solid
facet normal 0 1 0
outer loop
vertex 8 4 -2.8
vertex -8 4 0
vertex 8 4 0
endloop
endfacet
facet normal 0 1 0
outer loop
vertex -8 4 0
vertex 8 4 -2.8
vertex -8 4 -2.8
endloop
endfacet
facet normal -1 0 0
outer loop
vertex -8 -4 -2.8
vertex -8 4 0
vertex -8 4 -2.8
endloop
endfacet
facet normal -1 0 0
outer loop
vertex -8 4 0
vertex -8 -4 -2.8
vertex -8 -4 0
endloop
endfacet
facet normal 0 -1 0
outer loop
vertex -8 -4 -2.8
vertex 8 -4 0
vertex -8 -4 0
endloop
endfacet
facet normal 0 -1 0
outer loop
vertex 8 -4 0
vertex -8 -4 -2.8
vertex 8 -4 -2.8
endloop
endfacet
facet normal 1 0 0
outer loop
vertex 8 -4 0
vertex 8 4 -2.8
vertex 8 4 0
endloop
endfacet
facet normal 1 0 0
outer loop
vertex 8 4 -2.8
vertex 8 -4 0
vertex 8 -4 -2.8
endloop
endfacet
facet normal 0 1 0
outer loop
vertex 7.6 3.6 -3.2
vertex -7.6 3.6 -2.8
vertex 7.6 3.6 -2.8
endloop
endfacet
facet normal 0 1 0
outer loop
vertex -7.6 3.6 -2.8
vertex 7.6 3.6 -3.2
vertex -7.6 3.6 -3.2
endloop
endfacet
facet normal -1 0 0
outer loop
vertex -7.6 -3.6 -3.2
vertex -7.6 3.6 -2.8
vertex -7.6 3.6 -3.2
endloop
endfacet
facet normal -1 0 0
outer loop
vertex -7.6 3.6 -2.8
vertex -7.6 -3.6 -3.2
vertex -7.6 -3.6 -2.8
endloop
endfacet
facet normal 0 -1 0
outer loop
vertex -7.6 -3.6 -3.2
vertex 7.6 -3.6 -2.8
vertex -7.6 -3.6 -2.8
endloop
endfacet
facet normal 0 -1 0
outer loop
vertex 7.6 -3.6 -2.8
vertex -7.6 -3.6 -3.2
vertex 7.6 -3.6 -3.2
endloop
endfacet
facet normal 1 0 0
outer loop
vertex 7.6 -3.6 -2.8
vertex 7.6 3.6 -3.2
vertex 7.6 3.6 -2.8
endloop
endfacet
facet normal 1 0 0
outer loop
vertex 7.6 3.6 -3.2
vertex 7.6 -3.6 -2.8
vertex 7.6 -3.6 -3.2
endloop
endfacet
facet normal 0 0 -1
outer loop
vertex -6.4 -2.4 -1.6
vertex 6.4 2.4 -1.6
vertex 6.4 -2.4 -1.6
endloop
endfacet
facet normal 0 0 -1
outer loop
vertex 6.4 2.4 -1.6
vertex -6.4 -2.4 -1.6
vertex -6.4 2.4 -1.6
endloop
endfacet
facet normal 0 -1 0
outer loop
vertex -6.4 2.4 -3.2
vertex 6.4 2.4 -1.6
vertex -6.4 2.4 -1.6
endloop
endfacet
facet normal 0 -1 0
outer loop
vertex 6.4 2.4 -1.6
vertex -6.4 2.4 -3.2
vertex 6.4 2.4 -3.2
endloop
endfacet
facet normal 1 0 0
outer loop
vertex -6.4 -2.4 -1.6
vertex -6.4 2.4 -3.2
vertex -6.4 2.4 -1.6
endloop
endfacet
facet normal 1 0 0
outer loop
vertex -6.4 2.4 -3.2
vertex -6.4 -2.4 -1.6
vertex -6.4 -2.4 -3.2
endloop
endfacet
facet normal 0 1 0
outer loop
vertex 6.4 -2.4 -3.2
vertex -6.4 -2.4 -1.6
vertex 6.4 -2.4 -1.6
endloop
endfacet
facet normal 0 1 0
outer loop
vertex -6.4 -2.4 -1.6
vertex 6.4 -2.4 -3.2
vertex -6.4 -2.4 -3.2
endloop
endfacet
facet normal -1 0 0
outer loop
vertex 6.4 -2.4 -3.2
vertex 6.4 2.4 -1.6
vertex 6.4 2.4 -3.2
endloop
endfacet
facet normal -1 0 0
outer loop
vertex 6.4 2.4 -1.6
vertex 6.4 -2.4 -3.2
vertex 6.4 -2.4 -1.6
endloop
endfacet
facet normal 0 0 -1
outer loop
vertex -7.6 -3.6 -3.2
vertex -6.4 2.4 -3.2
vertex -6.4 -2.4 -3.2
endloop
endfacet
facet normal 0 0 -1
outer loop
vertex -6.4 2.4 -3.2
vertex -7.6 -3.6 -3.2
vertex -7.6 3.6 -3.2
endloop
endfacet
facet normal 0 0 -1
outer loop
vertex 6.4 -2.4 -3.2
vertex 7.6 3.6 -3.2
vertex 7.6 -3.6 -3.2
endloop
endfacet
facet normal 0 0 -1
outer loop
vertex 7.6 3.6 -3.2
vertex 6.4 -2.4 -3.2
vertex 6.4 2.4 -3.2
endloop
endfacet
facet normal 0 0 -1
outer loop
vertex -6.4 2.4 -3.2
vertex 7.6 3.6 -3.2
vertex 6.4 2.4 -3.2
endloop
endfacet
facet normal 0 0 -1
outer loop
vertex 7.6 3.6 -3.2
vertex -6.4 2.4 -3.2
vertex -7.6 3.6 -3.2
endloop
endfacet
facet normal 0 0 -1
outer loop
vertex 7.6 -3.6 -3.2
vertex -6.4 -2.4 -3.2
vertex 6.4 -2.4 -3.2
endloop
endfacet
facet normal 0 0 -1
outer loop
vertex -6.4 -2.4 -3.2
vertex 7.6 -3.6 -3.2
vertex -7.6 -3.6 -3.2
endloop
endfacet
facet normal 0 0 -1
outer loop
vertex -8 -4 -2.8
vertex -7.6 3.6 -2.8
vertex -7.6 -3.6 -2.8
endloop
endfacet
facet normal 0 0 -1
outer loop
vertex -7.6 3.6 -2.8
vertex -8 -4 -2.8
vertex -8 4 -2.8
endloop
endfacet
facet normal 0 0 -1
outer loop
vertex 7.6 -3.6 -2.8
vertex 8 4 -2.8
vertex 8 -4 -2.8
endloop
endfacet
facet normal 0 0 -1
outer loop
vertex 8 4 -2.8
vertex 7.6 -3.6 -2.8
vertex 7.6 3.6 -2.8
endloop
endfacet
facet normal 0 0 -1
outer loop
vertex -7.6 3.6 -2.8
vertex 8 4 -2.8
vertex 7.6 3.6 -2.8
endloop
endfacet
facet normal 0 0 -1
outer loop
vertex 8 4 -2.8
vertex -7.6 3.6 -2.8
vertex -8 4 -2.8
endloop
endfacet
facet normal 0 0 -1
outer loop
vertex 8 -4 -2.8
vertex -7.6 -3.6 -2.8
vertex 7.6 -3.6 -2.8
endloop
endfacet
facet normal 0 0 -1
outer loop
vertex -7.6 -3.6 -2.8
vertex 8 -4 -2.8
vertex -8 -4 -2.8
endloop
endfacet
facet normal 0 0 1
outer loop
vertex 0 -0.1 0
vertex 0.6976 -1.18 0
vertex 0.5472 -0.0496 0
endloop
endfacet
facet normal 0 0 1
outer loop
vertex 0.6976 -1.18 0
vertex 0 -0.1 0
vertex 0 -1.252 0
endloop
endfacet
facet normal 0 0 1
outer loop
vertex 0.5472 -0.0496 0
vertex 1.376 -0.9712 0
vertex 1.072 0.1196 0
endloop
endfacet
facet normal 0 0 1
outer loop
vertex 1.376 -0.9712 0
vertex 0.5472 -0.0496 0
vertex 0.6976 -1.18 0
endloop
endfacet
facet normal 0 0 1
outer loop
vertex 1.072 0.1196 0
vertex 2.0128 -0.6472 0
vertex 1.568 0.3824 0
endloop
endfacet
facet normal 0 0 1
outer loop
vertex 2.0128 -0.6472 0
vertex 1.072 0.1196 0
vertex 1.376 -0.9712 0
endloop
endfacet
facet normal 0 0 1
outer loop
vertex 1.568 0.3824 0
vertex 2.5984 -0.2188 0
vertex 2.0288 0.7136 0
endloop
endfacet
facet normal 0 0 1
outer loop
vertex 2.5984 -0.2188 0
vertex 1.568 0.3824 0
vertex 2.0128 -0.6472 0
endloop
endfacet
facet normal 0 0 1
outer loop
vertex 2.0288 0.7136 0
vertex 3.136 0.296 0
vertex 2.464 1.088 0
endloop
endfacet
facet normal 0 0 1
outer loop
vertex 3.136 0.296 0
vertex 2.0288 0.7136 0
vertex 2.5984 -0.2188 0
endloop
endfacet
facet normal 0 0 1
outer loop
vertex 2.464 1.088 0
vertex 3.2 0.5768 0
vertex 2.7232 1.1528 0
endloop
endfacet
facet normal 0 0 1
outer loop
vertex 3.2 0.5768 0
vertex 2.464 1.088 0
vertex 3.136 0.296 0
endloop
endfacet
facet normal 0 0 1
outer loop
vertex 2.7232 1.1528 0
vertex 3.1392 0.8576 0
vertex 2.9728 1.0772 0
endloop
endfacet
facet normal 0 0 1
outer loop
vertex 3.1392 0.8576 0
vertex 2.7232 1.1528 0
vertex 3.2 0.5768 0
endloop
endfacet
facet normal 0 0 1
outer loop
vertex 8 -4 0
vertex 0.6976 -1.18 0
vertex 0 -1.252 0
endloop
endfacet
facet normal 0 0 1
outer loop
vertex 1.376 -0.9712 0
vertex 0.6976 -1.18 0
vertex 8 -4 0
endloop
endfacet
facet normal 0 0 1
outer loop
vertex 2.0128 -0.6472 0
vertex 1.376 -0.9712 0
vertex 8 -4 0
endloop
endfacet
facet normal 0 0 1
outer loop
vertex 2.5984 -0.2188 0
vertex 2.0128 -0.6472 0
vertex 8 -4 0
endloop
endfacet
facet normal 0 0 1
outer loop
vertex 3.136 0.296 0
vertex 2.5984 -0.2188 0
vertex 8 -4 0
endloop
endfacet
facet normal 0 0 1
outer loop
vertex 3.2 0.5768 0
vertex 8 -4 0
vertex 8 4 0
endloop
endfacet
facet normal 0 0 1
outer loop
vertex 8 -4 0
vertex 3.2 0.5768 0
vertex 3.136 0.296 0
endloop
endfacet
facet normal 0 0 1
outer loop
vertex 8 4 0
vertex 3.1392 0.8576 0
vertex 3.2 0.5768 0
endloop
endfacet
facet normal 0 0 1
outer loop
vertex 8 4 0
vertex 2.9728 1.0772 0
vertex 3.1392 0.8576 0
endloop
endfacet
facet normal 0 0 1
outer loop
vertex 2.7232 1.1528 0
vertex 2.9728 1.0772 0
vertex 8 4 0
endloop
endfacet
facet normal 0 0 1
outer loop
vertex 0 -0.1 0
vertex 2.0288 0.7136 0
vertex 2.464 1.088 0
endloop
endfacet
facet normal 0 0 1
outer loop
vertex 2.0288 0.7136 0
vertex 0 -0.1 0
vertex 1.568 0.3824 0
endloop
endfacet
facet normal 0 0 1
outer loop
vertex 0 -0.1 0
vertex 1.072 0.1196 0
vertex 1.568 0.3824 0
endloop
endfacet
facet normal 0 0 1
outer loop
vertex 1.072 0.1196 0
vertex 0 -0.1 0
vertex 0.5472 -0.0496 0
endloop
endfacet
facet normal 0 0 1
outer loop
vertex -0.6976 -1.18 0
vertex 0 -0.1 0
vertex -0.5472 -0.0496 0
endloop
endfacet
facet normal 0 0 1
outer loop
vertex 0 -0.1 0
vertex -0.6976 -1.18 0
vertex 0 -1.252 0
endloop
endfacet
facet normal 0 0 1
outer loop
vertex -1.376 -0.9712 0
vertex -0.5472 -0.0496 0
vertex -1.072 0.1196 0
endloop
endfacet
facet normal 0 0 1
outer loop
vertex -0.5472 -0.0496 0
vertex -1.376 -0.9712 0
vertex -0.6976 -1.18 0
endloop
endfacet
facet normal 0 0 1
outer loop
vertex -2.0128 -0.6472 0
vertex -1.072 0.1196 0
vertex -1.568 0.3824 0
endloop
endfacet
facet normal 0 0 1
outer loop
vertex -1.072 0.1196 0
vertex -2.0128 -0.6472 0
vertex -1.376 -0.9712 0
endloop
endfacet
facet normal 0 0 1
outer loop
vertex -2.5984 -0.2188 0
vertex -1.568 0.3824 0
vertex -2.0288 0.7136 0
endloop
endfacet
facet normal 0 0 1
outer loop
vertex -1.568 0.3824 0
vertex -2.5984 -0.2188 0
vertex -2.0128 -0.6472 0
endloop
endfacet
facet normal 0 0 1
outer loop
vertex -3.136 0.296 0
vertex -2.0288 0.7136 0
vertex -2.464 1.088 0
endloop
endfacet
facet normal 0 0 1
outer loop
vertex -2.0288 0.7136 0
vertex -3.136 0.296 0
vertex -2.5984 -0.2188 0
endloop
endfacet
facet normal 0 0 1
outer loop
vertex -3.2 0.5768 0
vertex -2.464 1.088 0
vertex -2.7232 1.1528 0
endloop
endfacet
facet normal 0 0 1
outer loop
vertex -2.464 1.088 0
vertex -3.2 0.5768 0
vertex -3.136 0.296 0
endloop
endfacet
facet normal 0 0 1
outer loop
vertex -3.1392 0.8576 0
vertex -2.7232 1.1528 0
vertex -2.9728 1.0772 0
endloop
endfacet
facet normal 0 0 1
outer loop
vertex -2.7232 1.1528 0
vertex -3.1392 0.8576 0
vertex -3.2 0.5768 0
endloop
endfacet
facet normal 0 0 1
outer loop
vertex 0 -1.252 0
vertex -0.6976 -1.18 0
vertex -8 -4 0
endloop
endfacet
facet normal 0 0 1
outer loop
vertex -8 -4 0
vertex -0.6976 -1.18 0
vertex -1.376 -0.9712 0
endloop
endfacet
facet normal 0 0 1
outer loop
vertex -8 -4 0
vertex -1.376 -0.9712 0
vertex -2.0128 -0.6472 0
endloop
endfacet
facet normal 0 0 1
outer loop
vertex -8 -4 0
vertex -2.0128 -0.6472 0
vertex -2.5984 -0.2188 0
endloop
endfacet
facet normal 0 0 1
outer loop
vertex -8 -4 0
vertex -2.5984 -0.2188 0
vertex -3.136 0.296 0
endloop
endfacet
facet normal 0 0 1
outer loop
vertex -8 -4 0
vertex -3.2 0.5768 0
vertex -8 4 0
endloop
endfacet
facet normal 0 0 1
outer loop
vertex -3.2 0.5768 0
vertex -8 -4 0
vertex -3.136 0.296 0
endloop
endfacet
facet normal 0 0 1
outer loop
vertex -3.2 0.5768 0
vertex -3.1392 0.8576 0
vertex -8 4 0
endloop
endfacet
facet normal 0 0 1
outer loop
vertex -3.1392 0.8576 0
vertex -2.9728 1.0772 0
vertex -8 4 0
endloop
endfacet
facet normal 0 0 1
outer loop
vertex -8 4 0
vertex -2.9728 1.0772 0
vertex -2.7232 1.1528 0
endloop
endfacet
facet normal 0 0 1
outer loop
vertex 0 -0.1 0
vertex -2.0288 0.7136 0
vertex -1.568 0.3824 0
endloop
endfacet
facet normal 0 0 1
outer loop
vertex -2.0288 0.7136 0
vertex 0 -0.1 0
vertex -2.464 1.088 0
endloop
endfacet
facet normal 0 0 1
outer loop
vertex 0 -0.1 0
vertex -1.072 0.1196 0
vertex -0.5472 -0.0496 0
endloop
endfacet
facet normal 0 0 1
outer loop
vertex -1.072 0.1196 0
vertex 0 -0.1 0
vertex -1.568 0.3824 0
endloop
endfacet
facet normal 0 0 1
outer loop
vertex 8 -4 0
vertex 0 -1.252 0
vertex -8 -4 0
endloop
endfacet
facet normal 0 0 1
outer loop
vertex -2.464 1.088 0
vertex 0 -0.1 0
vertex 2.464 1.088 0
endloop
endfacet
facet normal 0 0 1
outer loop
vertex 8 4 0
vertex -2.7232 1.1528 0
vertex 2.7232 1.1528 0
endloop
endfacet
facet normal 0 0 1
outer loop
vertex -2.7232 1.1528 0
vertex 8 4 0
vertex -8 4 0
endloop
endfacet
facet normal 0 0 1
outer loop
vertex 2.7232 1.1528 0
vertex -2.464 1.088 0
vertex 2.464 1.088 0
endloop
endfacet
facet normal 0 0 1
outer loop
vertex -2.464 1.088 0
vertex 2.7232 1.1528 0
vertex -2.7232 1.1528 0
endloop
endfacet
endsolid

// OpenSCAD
// file: ../p/box5.scad
use <../lib.scad>
function ldraw_lib__box5() = [
// 0 Box with 5 Faces and All Edges
// 0 Name: box5.dat
// 0 Author: James Jessiman
// 0 !LDRAW_ORG Primitive UPDATE 2012-01
// 0 !LICENSE Licensed under CC BY 4.0 : see CAreadme.txt
// 
// 0 BFC CERTIFY CCW
  [0,"BFC","CERTIFY"],
  [0,"BFC","CCW"],
// 
// 0 !HISTORY 2002-04-03 [sbliss] Modified for BFC compliance
// 0 !HISTORY 2002-04-25 [PTadmin] Official Update 2002-02
// 0 !HISTORY 2007-06-24 [PTadmin] Header formatted for Contributor Agreement
// 0 !HISTORY 2008-07-01 [PTadmin] Official Update 2008-01
// 0 !HISTORY 2012-02-16 [Philo] Changed to CCW
// 0 !HISTORY 2012-03-30 [PTadmin] Official Update 2012-01
// 
// 
// 2 24 1 1 1 -1 1 1
  [2,24,1,1,1,-1,1,1],
// 2 24 -1 1 1 -1 1 -1
  [2,24,-1,1,1,-1,1,-1],
// 2 24 -1 1 -1 1 1 -1
  [2,24,-1,1,-1,1,1,-1],
// 2 24 1 1 -1 1 1 1
  [2,24,1,1,-1,1,1,1],
// 2 24 1 0 1 -1 0 1
  [2,24,1,0,1,-1,0,1],
// 2 24 -1 0 1 -1 0 -1
  [2,24,-1,0,1,-1,0,-1],
// 2 24 -1 0 -1 1 0 -1
  [2,24,-1,0,-1,1,0,-1],
// 2 24 1 0 -1 1 0 1
  [2,24,1,0,-1,1,0,1],
// 2 24 1 0 1 1 1 1
  [2,24,1,0,1,1,1,1],
// 2 24 -1 0 1 -1 1 1
  [2,24,-1,0,1,-1,1,1],
// 2 24 1 0 -1 1 1 -1
  [2,24,1,0,-1,1,1,-1],
// 2 24 -1 0 -1 -1 1 -1
  [2,24,-1,0,-1,-1,1,-1],
// 4 16 -1 1 1 1 1 1 1 1 -1 -1 1 -1
  [4,16,-1,1,1,1,1,1,1,1,-1,-1,1,-1],
// 4 16 -1 1 1 -1 0 1 1 0 1 1 1 1
  [4,16,-1,1,1,-1,0,1,1,0,1,1,1,1],
// 4 16 -1 1 -1 -1 0 -1 -1 0 1 -1 1 1
  [4,16,-1,1,-1,-1,0,-1,-1,0,1,-1,1,1],
// 4 16 1 1 -1 1 0 -1 -1 0 -1 -1 1 -1
  [4,16,1,1,-1,1,0,-1,-1,0,-1,-1,1,-1],
// 4 16 1 1 1 1 0 1 1 0 -1 1 1 -1
  [4,16,1,1,1,1,0,1,1,0,-1,1,1,-1],
];
module ldraw_lib__box5(step=0, col=false, unit=2/5, alt=false, line=0.2, solid=!$preview)
    makepoly(ldraw_lib__box5(), step=step, col=col, unit=unit, alt=alt, line=line, solid=solid);
ldraw_lib__box5(line=0.2);
// file: ../p/box4.scad
use <../lib.scad>
function ldraw_lib__box4() = [
// 0 Box with 4 Faces (2 Parallel Pairs) and All Edges
// 0 Name: box4.dat
// 0 Author: James Jessiman
// 0 !LDRAW_ORG Primitive UPDATE 2012-01
// 0 !LICENSE Licensed under CC BY 4.0 : see CAreadme.txt
// 
// 0 BFC CERTIFY CCW
  [0,"BFC","CERTIFY"],
  [0,"BFC","CCW"],
// 
// 0 !HISTORY 2002-04-03 [sbliss] Modified for BFC compliance
// 0 !HISTORY 2002-04-25 [PTadmin] Official Update 2002-02
// 0 !HISTORY 2007-06-24 [PTadmin] Header formatted for Contributor Agreement
// 0 !HISTORY 2008-07-01 [PTadmin] Official Update 2008-01
// 0 !HISTORY 2012-02-16 [Philo] Changed to CCW
// 0 !HISTORY 2012-03-30 [PTadmin] Official Update 2012-01
// 
// 
// 2 24 1 1 1 -1 1 1
  [2,24,1,1,1,-1,1,1],
// 2 24 -1 1 1 -1 1 -1
  [2,24,-1,1,1,-1,1,-1],
// 2 24 -1 1 -1 1 1 -1
  [2,24,-1,1,-1,1,1,-1],
// 2 24 1 1 -1 1 1 1
  [2,24,1,1,-1,1,1,1],
// 2 24 1 0 1 -1 0 1
  [2,24,1,0,1,-1,0,1],
// 2 24 -1 0 1 -1 0 -1
  [2,24,-1,0,1,-1,0,-1],
// 2 24 -1 0 -1 1 0 -1
  [2,24,-1,0,-1,1,0,-1],
// 2 24 1 0 -1 1 0 1
  [2,24,1,0,-1,1,0,1],
// 2 24 1 0 1 1 1 1
  [2,24,1,0,1,1,1,1],
// 2 24 -1 0 1 -1 1 1
  [2,24,-1,0,1,-1,1,1],
// 2 24 1 0 -1 1 1 -1
  [2,24,1,0,-1,1,1,-1],
// 2 24 -1 0 -1 -1 1 -1
  [2,24,-1,0,-1,-1,1,-1],
// 4 16 -1 1 1 -1 0 1 1 0 1 1 1 1
  [4,16,-1,1,1,-1,0,1,1,0,1,1,1,1],
// 4 16 -1 1 -1 -1 0 -1 -1 0 1 -1 1 1
  [4,16,-1,1,-1,-1,0,-1,-1,0,1,-1,1,1],
// 4 16 1 1 -1 1 0 -1 -1 0 -1 -1 1 -1
  [4,16,1,1,-1,1,0,-1,-1,0,-1,-1,1,-1],
// 4 16 1 1 1 1 0 1 1 0 -1 1 1 -1
  [4,16,1,1,1,1,0,1,1,0,-1,1,1,-1],
];
module ldraw_lib__box4(step=0, col=false, unit=2/5, alt=false, line=0.2, solid=!$preview)
    makepoly(ldraw_lib__box4(), step=step, col=col, unit=unit, alt=alt, line=line, solid=solid);
ldraw_lib__box4(line=0.2);
// file: s/3069bs01.scad
use <../../lib.scad>
use <../../p/box4.scad>
use <../../p/box5.scad>
function ldraw_lib__s__3069bs01() = [
// 0 ~Tile  1 x  2 with Groove without Top Face
// 0 Name: s\3069bs01.dat
// 0 Author: Santeri Piippo [arezey]
// 0 !LDRAW_ORG Subpart UPDATE 2010-02
// 0 !LICENSE Licensed under CC BY 4.0 : see CAreadme.txt
// 
// 0 BFC CERTIFY CCW
  [0,"BFC","CERTIFY"],
  [0,"BFC","CCW"],
// 
// 0 !HISTORY 2010-07-05 [PTadmin] Official Update 2010-02
// 
// 
// 1 16 0 0 0 20 0 0 0 7 0 0 0 10 box4.dat
  [1,16,0,0,0,20,0,0,0,7,0,0,0,10, ldraw_lib__box4()],
// 1 16 0 7 0 19 0 0 0 1 0 0 0 9 box4.dat
  [1,16,0,7,0,19,0,0,0,1,0,0,0,9, ldraw_lib__box4()],
// 0 BFC INVERTNEXT
  [0,"BFC","INVERTNEXT"],
// 1 16 0 8 0 16 0 0 0 -4 0 0 0 6 box5.dat
  [1,16,0,8,0,16,0,0,0,-4,0,0,0,6, ldraw_lib__box5()],
// 4 16 -19 8 9 -16 8 6 -16 8 -6 -19 8 -9
  [4,16,-19,8,9,-16,8,6,-16,8,-6,-19,8,-9],
// 4 16 19 8 -9 16 8 -6 16 8 6 19 8 9
  [4,16,19,8,-9,16,8,-6,16,8,6,19,8,9],
// 4 16 19 8 9 16 8 6 -16 8 6 -19 8 9
  [4,16,19,8,9,16,8,6,-16,8,6,-19,8,9],
// 4 16 -19 8 -9 -16 8 -6 16 8 -6 19 8 -9
  [4,16,-19,8,-9,-16,8,-6,16,8,-6,19,8,-9],
// 4 16 -20 7 10 -19 7 9 -19 7 -9 -20 7 -10
  [4,16,-20,7,10,-19,7,9,-19,7,-9,-20,7,-10],
// 4 16 20 7 -10 19 7 -9 19 7 9 20 7 10
  [4,16,20,7,-10,19,7,-9,19,7,9,20,7,10],
// 4 16 20 7 10 19 7 9 -19 7 9 -20 7 10
  [4,16,20,7,10,19,7,9,-19,7,9,-20,7,10],
// 4 16 -20 7 -10 -19 7 -9 19 7 -9 20 7 -10
  [4,16,-20,7,-10,-19,7,-9,19,7,-9,20,7,-10],
// 0 //
];
module ldraw_lib__s__3069bs01(step=0, col=false, unit=2/5, alt=false, line=0.2, solid=!$preview)
    makepoly(ldraw_lib__s__3069bs01(), step=step, col=col, unit=unit, alt=alt, line=line, solid=solid);
ldraw_lib__s__3069bs01(line=0.2);
// file: s/3069bp69s01.scad
use <../../lib.scad>
function ldraw_lib__s__3069bp69s01() = [
// 0 ~Tile  1 x  2 with Black Smile Pattern - Half
// 0 Name: s\3069bp69s01.dat
// 0 Author: Jeff Jones [notmaster]
// 0 !LDRAW_ORG Subpart UPDATE 2026-02
// 0 !LICENSE Licensed under CC BY 4.0 : see CAreadme.txt
// 
// 0 BFC CERTIFY CCW
  [0,"BFC","CERTIFY"],
  [0,"BFC","CCW"],
// 
// 0 !HISTORY 2025-08-03 [notmaster] subparted from 3004p0gs01.dat
// 0 !HISTORY 2026-03-06 [OrionP] Official Update 2026-02
// 
// 4 0 1.744 0 -2.95 1.368 0 -.124 0 0 -.25 0 0 -3.13
  [4,0,1.744,0,-2.95,1.368,0,-.124,0,0,-.25,0,0,-3.13],
// 4 0 1.744 0 -2.95 3.44 0 -2.428 2.68 0 .299 1.368 0 -.124
  [4,0,1.744,0,-2.95,3.44,0,-2.428,2.68,0,.299,1.368,0,-.124],
// 4 0 3.44 0 -2.428 5.032 0 -1.618 3.92 0 .956 2.68 0 .299
  [4,0,3.44,0,-2.428,5.032,0,-1.618,3.92,0,.956,2.68,0,.299],
// 4 0 5.032 0 -1.618 6.496 0 -.547 5.072 0 1.784 3.92 0 .956
  [4,0,5.032,0,-1.618,6.496,0,-.547,5.072,0,1.784,3.92,0,.956],
// 4 0 6.16 0 2.72 5.072 0 1.784 6.496 0 -.547 7.84 0 .74
  [4,0,6.16,0,2.72,5.072,0,1.784,6.496,0,-.547,7.84,0,.74],
// 4 0 6.16 0 2.72 7.84 0 .74 8 0 1.442 6.808 0 2.882
  [4,0,6.16,0,2.72,7.84,0,.74,8,0,1.442,6.808,0,2.882],
// 4 0 7.432 0 2.693 6.808 0 2.882 8 0 1.442 7.848 0 2.144
  [4,0,7.432,0,2.693,6.808,0,2.882,8,0,1.442,7.848,0,2.144],
// 3 16 20 0 -10 1.744 0 -2.95 0 0 -3.13
  [3,16,20,0,-10,1.744,0,-2.95,0,0,-3.13],
// 3 16 3.44 0 -2.428 1.744 0 -2.95 20 0 -10
  [3,16,3.44,0,-2.428,1.744,0,-2.95,20,0,-10],
// 3 16 5.032 0 -1.618 3.44 0 -2.428 20 0 -10
  [3,16,5.032,0,-1.618,3.44,0,-2.428,20,0,-10],
// 3 16 6.496 0 -.547 5.032 0 -1.618 20 0 -10
  [3,16,6.496,0,-.547,5.032,0,-1.618,20,0,-10],
// 3 16 7.84 0 .74 6.496 0 -.547 20 0 -10
  [3,16,7.84,0,.74,6.496,0,-.547,20,0,-10],
// 4 16 7.84 0 .74 20 0 -10 20 0 10 8 0 1.442
  [4,16,7.84,0,.74,20,0,-10,20,0,10,8,0,1.442],
// 3 16 20 0 10 7.848 0 2.144 8 0 1.442
  [3,16,20,0,10,7.848,0,2.144,8,0,1.442],
// 3 16 20 0 10 7.432 0 2.693 7.848 0 2.144
  [3,16,20,0,10,7.432,0,2.693,7.848,0,2.144],
// 3 16 6.808 0 2.882 7.432 0 2.693 20 0 10
  [3,16,6.808,0,2.882,7.432,0,2.693,20,0,10],
// 4 16 6.16 0 2.72 0 0 -.25 3.92 0 .956 5.072 0 1.784
  [4,16,6.16,0,2.72,0,0,-.25,3.92,0,.956,5.072,0,1.784],
// 4 16 1.368 0 -.124 2.68 0 .299 3.92 0 .956 0 0 -.25
  [4,16,1.368,0,-.124,2.68,0,.299,3.92,0,.956,0,0,-.25],
];
module ldraw_lib__s__3069bp69s01(step=0, col=false, unit=2/5, alt=false, line=0.2, solid=!$preview)
    makepoly(ldraw_lib__s__3069bp69s01(), step=step, col=col, unit=unit, alt=alt, line=line, solid=solid);
ldraw_lib__s__3069bp69s01(line=0.2);
// main file
use <../lib.scad>
use <s/3069bp69s01.scad>
use <s/3069bs01.scad>
function ldraw_lib__3069bp69() = [
// 0 Tile  1 x  2 with Black Smile Pattern
// 0 Name: 3069bp69.dat
// 0 Author: Jeff Jones [notmaster]
// 0 !LDRAW_ORG Part UPDATE 2026-02
// 0 !LICENSE Licensed under CC BY 4.0 : see CAreadme.txt
// 
// 0 BFC CERTIFY CCW
  [0,"BFC","CERTIFY"],
  [0,"BFC","CCW"],
// 
// 0 !KEYWORDS Bricklink 3069pb1145, Brickowl 347833, Brickset 102762
// 0 !KEYWORDS Rebrickable 3069bpr0372, Set 11031
// 
// 0 !HISTORY 2026-03-06 [OrionP] Official Update 2026-02
// 
// 1 16 0 0 0 1 0 0 0 1 0 0 0 1 s\3069bs01.dat
  [1,16,0,0,0,1,0,0,0,1,0,0,0,1, ldraw_lib__s__3069bs01()],
// 1 16 0 0 0 1 0 0 0 1 0 0 0 1 s\3069bp69s01.dat
  [1,16,0,0,0,1,0,0,0,1,0,0,0,1, ldraw_lib__s__3069bp69s01()],
// 1 16 0 0 0 -1 0 0 0 1 0 0 0 1 s\3069bp69s01.dat
  [1,16,0,0,0,-1,0,0,0,1,0,0,0,1, ldraw_lib__s__3069bp69s01()],
// 3 16 20 0 -10 0 0 -3.13 -20 0 -10
  [3,16,20,0,-10,0,0,-3.13,-20,0,-10],
// 3 16 -6.16 0 2.72 0 0 -.25 6.16 0 2.72
  [3,16,-6.16,0,2.72,0,0,-.25,6.16,0,2.72],
// 4 16 6.808 0 2.882 20 0 10 -20 0 10 -6.808 0 2.882
  [4,16,6.808,0,2.882,20,0,10,-20,0,10,-6.808,0,2.882],
// 4 16 6.808 0 2.882 -6.808 0 2.882 -6.16 0 2.72 6.16 0 2.72
  [4,16,6.808,0,2.882,-6.808,0,2.882,-6.16,0,2.72,6.16,0,2.72],
];
module ldraw_lib__3069bp69(step=0, col=false, unit=2/5, alt=false, line=0.2, solid=!$preview)
    makepoly(ldraw_lib__3069bp69(), step=step, col=col, unit=unit, alt=alt, line=line, solid=solid);
ldraw_lib__3069bp69(line=0.2);
